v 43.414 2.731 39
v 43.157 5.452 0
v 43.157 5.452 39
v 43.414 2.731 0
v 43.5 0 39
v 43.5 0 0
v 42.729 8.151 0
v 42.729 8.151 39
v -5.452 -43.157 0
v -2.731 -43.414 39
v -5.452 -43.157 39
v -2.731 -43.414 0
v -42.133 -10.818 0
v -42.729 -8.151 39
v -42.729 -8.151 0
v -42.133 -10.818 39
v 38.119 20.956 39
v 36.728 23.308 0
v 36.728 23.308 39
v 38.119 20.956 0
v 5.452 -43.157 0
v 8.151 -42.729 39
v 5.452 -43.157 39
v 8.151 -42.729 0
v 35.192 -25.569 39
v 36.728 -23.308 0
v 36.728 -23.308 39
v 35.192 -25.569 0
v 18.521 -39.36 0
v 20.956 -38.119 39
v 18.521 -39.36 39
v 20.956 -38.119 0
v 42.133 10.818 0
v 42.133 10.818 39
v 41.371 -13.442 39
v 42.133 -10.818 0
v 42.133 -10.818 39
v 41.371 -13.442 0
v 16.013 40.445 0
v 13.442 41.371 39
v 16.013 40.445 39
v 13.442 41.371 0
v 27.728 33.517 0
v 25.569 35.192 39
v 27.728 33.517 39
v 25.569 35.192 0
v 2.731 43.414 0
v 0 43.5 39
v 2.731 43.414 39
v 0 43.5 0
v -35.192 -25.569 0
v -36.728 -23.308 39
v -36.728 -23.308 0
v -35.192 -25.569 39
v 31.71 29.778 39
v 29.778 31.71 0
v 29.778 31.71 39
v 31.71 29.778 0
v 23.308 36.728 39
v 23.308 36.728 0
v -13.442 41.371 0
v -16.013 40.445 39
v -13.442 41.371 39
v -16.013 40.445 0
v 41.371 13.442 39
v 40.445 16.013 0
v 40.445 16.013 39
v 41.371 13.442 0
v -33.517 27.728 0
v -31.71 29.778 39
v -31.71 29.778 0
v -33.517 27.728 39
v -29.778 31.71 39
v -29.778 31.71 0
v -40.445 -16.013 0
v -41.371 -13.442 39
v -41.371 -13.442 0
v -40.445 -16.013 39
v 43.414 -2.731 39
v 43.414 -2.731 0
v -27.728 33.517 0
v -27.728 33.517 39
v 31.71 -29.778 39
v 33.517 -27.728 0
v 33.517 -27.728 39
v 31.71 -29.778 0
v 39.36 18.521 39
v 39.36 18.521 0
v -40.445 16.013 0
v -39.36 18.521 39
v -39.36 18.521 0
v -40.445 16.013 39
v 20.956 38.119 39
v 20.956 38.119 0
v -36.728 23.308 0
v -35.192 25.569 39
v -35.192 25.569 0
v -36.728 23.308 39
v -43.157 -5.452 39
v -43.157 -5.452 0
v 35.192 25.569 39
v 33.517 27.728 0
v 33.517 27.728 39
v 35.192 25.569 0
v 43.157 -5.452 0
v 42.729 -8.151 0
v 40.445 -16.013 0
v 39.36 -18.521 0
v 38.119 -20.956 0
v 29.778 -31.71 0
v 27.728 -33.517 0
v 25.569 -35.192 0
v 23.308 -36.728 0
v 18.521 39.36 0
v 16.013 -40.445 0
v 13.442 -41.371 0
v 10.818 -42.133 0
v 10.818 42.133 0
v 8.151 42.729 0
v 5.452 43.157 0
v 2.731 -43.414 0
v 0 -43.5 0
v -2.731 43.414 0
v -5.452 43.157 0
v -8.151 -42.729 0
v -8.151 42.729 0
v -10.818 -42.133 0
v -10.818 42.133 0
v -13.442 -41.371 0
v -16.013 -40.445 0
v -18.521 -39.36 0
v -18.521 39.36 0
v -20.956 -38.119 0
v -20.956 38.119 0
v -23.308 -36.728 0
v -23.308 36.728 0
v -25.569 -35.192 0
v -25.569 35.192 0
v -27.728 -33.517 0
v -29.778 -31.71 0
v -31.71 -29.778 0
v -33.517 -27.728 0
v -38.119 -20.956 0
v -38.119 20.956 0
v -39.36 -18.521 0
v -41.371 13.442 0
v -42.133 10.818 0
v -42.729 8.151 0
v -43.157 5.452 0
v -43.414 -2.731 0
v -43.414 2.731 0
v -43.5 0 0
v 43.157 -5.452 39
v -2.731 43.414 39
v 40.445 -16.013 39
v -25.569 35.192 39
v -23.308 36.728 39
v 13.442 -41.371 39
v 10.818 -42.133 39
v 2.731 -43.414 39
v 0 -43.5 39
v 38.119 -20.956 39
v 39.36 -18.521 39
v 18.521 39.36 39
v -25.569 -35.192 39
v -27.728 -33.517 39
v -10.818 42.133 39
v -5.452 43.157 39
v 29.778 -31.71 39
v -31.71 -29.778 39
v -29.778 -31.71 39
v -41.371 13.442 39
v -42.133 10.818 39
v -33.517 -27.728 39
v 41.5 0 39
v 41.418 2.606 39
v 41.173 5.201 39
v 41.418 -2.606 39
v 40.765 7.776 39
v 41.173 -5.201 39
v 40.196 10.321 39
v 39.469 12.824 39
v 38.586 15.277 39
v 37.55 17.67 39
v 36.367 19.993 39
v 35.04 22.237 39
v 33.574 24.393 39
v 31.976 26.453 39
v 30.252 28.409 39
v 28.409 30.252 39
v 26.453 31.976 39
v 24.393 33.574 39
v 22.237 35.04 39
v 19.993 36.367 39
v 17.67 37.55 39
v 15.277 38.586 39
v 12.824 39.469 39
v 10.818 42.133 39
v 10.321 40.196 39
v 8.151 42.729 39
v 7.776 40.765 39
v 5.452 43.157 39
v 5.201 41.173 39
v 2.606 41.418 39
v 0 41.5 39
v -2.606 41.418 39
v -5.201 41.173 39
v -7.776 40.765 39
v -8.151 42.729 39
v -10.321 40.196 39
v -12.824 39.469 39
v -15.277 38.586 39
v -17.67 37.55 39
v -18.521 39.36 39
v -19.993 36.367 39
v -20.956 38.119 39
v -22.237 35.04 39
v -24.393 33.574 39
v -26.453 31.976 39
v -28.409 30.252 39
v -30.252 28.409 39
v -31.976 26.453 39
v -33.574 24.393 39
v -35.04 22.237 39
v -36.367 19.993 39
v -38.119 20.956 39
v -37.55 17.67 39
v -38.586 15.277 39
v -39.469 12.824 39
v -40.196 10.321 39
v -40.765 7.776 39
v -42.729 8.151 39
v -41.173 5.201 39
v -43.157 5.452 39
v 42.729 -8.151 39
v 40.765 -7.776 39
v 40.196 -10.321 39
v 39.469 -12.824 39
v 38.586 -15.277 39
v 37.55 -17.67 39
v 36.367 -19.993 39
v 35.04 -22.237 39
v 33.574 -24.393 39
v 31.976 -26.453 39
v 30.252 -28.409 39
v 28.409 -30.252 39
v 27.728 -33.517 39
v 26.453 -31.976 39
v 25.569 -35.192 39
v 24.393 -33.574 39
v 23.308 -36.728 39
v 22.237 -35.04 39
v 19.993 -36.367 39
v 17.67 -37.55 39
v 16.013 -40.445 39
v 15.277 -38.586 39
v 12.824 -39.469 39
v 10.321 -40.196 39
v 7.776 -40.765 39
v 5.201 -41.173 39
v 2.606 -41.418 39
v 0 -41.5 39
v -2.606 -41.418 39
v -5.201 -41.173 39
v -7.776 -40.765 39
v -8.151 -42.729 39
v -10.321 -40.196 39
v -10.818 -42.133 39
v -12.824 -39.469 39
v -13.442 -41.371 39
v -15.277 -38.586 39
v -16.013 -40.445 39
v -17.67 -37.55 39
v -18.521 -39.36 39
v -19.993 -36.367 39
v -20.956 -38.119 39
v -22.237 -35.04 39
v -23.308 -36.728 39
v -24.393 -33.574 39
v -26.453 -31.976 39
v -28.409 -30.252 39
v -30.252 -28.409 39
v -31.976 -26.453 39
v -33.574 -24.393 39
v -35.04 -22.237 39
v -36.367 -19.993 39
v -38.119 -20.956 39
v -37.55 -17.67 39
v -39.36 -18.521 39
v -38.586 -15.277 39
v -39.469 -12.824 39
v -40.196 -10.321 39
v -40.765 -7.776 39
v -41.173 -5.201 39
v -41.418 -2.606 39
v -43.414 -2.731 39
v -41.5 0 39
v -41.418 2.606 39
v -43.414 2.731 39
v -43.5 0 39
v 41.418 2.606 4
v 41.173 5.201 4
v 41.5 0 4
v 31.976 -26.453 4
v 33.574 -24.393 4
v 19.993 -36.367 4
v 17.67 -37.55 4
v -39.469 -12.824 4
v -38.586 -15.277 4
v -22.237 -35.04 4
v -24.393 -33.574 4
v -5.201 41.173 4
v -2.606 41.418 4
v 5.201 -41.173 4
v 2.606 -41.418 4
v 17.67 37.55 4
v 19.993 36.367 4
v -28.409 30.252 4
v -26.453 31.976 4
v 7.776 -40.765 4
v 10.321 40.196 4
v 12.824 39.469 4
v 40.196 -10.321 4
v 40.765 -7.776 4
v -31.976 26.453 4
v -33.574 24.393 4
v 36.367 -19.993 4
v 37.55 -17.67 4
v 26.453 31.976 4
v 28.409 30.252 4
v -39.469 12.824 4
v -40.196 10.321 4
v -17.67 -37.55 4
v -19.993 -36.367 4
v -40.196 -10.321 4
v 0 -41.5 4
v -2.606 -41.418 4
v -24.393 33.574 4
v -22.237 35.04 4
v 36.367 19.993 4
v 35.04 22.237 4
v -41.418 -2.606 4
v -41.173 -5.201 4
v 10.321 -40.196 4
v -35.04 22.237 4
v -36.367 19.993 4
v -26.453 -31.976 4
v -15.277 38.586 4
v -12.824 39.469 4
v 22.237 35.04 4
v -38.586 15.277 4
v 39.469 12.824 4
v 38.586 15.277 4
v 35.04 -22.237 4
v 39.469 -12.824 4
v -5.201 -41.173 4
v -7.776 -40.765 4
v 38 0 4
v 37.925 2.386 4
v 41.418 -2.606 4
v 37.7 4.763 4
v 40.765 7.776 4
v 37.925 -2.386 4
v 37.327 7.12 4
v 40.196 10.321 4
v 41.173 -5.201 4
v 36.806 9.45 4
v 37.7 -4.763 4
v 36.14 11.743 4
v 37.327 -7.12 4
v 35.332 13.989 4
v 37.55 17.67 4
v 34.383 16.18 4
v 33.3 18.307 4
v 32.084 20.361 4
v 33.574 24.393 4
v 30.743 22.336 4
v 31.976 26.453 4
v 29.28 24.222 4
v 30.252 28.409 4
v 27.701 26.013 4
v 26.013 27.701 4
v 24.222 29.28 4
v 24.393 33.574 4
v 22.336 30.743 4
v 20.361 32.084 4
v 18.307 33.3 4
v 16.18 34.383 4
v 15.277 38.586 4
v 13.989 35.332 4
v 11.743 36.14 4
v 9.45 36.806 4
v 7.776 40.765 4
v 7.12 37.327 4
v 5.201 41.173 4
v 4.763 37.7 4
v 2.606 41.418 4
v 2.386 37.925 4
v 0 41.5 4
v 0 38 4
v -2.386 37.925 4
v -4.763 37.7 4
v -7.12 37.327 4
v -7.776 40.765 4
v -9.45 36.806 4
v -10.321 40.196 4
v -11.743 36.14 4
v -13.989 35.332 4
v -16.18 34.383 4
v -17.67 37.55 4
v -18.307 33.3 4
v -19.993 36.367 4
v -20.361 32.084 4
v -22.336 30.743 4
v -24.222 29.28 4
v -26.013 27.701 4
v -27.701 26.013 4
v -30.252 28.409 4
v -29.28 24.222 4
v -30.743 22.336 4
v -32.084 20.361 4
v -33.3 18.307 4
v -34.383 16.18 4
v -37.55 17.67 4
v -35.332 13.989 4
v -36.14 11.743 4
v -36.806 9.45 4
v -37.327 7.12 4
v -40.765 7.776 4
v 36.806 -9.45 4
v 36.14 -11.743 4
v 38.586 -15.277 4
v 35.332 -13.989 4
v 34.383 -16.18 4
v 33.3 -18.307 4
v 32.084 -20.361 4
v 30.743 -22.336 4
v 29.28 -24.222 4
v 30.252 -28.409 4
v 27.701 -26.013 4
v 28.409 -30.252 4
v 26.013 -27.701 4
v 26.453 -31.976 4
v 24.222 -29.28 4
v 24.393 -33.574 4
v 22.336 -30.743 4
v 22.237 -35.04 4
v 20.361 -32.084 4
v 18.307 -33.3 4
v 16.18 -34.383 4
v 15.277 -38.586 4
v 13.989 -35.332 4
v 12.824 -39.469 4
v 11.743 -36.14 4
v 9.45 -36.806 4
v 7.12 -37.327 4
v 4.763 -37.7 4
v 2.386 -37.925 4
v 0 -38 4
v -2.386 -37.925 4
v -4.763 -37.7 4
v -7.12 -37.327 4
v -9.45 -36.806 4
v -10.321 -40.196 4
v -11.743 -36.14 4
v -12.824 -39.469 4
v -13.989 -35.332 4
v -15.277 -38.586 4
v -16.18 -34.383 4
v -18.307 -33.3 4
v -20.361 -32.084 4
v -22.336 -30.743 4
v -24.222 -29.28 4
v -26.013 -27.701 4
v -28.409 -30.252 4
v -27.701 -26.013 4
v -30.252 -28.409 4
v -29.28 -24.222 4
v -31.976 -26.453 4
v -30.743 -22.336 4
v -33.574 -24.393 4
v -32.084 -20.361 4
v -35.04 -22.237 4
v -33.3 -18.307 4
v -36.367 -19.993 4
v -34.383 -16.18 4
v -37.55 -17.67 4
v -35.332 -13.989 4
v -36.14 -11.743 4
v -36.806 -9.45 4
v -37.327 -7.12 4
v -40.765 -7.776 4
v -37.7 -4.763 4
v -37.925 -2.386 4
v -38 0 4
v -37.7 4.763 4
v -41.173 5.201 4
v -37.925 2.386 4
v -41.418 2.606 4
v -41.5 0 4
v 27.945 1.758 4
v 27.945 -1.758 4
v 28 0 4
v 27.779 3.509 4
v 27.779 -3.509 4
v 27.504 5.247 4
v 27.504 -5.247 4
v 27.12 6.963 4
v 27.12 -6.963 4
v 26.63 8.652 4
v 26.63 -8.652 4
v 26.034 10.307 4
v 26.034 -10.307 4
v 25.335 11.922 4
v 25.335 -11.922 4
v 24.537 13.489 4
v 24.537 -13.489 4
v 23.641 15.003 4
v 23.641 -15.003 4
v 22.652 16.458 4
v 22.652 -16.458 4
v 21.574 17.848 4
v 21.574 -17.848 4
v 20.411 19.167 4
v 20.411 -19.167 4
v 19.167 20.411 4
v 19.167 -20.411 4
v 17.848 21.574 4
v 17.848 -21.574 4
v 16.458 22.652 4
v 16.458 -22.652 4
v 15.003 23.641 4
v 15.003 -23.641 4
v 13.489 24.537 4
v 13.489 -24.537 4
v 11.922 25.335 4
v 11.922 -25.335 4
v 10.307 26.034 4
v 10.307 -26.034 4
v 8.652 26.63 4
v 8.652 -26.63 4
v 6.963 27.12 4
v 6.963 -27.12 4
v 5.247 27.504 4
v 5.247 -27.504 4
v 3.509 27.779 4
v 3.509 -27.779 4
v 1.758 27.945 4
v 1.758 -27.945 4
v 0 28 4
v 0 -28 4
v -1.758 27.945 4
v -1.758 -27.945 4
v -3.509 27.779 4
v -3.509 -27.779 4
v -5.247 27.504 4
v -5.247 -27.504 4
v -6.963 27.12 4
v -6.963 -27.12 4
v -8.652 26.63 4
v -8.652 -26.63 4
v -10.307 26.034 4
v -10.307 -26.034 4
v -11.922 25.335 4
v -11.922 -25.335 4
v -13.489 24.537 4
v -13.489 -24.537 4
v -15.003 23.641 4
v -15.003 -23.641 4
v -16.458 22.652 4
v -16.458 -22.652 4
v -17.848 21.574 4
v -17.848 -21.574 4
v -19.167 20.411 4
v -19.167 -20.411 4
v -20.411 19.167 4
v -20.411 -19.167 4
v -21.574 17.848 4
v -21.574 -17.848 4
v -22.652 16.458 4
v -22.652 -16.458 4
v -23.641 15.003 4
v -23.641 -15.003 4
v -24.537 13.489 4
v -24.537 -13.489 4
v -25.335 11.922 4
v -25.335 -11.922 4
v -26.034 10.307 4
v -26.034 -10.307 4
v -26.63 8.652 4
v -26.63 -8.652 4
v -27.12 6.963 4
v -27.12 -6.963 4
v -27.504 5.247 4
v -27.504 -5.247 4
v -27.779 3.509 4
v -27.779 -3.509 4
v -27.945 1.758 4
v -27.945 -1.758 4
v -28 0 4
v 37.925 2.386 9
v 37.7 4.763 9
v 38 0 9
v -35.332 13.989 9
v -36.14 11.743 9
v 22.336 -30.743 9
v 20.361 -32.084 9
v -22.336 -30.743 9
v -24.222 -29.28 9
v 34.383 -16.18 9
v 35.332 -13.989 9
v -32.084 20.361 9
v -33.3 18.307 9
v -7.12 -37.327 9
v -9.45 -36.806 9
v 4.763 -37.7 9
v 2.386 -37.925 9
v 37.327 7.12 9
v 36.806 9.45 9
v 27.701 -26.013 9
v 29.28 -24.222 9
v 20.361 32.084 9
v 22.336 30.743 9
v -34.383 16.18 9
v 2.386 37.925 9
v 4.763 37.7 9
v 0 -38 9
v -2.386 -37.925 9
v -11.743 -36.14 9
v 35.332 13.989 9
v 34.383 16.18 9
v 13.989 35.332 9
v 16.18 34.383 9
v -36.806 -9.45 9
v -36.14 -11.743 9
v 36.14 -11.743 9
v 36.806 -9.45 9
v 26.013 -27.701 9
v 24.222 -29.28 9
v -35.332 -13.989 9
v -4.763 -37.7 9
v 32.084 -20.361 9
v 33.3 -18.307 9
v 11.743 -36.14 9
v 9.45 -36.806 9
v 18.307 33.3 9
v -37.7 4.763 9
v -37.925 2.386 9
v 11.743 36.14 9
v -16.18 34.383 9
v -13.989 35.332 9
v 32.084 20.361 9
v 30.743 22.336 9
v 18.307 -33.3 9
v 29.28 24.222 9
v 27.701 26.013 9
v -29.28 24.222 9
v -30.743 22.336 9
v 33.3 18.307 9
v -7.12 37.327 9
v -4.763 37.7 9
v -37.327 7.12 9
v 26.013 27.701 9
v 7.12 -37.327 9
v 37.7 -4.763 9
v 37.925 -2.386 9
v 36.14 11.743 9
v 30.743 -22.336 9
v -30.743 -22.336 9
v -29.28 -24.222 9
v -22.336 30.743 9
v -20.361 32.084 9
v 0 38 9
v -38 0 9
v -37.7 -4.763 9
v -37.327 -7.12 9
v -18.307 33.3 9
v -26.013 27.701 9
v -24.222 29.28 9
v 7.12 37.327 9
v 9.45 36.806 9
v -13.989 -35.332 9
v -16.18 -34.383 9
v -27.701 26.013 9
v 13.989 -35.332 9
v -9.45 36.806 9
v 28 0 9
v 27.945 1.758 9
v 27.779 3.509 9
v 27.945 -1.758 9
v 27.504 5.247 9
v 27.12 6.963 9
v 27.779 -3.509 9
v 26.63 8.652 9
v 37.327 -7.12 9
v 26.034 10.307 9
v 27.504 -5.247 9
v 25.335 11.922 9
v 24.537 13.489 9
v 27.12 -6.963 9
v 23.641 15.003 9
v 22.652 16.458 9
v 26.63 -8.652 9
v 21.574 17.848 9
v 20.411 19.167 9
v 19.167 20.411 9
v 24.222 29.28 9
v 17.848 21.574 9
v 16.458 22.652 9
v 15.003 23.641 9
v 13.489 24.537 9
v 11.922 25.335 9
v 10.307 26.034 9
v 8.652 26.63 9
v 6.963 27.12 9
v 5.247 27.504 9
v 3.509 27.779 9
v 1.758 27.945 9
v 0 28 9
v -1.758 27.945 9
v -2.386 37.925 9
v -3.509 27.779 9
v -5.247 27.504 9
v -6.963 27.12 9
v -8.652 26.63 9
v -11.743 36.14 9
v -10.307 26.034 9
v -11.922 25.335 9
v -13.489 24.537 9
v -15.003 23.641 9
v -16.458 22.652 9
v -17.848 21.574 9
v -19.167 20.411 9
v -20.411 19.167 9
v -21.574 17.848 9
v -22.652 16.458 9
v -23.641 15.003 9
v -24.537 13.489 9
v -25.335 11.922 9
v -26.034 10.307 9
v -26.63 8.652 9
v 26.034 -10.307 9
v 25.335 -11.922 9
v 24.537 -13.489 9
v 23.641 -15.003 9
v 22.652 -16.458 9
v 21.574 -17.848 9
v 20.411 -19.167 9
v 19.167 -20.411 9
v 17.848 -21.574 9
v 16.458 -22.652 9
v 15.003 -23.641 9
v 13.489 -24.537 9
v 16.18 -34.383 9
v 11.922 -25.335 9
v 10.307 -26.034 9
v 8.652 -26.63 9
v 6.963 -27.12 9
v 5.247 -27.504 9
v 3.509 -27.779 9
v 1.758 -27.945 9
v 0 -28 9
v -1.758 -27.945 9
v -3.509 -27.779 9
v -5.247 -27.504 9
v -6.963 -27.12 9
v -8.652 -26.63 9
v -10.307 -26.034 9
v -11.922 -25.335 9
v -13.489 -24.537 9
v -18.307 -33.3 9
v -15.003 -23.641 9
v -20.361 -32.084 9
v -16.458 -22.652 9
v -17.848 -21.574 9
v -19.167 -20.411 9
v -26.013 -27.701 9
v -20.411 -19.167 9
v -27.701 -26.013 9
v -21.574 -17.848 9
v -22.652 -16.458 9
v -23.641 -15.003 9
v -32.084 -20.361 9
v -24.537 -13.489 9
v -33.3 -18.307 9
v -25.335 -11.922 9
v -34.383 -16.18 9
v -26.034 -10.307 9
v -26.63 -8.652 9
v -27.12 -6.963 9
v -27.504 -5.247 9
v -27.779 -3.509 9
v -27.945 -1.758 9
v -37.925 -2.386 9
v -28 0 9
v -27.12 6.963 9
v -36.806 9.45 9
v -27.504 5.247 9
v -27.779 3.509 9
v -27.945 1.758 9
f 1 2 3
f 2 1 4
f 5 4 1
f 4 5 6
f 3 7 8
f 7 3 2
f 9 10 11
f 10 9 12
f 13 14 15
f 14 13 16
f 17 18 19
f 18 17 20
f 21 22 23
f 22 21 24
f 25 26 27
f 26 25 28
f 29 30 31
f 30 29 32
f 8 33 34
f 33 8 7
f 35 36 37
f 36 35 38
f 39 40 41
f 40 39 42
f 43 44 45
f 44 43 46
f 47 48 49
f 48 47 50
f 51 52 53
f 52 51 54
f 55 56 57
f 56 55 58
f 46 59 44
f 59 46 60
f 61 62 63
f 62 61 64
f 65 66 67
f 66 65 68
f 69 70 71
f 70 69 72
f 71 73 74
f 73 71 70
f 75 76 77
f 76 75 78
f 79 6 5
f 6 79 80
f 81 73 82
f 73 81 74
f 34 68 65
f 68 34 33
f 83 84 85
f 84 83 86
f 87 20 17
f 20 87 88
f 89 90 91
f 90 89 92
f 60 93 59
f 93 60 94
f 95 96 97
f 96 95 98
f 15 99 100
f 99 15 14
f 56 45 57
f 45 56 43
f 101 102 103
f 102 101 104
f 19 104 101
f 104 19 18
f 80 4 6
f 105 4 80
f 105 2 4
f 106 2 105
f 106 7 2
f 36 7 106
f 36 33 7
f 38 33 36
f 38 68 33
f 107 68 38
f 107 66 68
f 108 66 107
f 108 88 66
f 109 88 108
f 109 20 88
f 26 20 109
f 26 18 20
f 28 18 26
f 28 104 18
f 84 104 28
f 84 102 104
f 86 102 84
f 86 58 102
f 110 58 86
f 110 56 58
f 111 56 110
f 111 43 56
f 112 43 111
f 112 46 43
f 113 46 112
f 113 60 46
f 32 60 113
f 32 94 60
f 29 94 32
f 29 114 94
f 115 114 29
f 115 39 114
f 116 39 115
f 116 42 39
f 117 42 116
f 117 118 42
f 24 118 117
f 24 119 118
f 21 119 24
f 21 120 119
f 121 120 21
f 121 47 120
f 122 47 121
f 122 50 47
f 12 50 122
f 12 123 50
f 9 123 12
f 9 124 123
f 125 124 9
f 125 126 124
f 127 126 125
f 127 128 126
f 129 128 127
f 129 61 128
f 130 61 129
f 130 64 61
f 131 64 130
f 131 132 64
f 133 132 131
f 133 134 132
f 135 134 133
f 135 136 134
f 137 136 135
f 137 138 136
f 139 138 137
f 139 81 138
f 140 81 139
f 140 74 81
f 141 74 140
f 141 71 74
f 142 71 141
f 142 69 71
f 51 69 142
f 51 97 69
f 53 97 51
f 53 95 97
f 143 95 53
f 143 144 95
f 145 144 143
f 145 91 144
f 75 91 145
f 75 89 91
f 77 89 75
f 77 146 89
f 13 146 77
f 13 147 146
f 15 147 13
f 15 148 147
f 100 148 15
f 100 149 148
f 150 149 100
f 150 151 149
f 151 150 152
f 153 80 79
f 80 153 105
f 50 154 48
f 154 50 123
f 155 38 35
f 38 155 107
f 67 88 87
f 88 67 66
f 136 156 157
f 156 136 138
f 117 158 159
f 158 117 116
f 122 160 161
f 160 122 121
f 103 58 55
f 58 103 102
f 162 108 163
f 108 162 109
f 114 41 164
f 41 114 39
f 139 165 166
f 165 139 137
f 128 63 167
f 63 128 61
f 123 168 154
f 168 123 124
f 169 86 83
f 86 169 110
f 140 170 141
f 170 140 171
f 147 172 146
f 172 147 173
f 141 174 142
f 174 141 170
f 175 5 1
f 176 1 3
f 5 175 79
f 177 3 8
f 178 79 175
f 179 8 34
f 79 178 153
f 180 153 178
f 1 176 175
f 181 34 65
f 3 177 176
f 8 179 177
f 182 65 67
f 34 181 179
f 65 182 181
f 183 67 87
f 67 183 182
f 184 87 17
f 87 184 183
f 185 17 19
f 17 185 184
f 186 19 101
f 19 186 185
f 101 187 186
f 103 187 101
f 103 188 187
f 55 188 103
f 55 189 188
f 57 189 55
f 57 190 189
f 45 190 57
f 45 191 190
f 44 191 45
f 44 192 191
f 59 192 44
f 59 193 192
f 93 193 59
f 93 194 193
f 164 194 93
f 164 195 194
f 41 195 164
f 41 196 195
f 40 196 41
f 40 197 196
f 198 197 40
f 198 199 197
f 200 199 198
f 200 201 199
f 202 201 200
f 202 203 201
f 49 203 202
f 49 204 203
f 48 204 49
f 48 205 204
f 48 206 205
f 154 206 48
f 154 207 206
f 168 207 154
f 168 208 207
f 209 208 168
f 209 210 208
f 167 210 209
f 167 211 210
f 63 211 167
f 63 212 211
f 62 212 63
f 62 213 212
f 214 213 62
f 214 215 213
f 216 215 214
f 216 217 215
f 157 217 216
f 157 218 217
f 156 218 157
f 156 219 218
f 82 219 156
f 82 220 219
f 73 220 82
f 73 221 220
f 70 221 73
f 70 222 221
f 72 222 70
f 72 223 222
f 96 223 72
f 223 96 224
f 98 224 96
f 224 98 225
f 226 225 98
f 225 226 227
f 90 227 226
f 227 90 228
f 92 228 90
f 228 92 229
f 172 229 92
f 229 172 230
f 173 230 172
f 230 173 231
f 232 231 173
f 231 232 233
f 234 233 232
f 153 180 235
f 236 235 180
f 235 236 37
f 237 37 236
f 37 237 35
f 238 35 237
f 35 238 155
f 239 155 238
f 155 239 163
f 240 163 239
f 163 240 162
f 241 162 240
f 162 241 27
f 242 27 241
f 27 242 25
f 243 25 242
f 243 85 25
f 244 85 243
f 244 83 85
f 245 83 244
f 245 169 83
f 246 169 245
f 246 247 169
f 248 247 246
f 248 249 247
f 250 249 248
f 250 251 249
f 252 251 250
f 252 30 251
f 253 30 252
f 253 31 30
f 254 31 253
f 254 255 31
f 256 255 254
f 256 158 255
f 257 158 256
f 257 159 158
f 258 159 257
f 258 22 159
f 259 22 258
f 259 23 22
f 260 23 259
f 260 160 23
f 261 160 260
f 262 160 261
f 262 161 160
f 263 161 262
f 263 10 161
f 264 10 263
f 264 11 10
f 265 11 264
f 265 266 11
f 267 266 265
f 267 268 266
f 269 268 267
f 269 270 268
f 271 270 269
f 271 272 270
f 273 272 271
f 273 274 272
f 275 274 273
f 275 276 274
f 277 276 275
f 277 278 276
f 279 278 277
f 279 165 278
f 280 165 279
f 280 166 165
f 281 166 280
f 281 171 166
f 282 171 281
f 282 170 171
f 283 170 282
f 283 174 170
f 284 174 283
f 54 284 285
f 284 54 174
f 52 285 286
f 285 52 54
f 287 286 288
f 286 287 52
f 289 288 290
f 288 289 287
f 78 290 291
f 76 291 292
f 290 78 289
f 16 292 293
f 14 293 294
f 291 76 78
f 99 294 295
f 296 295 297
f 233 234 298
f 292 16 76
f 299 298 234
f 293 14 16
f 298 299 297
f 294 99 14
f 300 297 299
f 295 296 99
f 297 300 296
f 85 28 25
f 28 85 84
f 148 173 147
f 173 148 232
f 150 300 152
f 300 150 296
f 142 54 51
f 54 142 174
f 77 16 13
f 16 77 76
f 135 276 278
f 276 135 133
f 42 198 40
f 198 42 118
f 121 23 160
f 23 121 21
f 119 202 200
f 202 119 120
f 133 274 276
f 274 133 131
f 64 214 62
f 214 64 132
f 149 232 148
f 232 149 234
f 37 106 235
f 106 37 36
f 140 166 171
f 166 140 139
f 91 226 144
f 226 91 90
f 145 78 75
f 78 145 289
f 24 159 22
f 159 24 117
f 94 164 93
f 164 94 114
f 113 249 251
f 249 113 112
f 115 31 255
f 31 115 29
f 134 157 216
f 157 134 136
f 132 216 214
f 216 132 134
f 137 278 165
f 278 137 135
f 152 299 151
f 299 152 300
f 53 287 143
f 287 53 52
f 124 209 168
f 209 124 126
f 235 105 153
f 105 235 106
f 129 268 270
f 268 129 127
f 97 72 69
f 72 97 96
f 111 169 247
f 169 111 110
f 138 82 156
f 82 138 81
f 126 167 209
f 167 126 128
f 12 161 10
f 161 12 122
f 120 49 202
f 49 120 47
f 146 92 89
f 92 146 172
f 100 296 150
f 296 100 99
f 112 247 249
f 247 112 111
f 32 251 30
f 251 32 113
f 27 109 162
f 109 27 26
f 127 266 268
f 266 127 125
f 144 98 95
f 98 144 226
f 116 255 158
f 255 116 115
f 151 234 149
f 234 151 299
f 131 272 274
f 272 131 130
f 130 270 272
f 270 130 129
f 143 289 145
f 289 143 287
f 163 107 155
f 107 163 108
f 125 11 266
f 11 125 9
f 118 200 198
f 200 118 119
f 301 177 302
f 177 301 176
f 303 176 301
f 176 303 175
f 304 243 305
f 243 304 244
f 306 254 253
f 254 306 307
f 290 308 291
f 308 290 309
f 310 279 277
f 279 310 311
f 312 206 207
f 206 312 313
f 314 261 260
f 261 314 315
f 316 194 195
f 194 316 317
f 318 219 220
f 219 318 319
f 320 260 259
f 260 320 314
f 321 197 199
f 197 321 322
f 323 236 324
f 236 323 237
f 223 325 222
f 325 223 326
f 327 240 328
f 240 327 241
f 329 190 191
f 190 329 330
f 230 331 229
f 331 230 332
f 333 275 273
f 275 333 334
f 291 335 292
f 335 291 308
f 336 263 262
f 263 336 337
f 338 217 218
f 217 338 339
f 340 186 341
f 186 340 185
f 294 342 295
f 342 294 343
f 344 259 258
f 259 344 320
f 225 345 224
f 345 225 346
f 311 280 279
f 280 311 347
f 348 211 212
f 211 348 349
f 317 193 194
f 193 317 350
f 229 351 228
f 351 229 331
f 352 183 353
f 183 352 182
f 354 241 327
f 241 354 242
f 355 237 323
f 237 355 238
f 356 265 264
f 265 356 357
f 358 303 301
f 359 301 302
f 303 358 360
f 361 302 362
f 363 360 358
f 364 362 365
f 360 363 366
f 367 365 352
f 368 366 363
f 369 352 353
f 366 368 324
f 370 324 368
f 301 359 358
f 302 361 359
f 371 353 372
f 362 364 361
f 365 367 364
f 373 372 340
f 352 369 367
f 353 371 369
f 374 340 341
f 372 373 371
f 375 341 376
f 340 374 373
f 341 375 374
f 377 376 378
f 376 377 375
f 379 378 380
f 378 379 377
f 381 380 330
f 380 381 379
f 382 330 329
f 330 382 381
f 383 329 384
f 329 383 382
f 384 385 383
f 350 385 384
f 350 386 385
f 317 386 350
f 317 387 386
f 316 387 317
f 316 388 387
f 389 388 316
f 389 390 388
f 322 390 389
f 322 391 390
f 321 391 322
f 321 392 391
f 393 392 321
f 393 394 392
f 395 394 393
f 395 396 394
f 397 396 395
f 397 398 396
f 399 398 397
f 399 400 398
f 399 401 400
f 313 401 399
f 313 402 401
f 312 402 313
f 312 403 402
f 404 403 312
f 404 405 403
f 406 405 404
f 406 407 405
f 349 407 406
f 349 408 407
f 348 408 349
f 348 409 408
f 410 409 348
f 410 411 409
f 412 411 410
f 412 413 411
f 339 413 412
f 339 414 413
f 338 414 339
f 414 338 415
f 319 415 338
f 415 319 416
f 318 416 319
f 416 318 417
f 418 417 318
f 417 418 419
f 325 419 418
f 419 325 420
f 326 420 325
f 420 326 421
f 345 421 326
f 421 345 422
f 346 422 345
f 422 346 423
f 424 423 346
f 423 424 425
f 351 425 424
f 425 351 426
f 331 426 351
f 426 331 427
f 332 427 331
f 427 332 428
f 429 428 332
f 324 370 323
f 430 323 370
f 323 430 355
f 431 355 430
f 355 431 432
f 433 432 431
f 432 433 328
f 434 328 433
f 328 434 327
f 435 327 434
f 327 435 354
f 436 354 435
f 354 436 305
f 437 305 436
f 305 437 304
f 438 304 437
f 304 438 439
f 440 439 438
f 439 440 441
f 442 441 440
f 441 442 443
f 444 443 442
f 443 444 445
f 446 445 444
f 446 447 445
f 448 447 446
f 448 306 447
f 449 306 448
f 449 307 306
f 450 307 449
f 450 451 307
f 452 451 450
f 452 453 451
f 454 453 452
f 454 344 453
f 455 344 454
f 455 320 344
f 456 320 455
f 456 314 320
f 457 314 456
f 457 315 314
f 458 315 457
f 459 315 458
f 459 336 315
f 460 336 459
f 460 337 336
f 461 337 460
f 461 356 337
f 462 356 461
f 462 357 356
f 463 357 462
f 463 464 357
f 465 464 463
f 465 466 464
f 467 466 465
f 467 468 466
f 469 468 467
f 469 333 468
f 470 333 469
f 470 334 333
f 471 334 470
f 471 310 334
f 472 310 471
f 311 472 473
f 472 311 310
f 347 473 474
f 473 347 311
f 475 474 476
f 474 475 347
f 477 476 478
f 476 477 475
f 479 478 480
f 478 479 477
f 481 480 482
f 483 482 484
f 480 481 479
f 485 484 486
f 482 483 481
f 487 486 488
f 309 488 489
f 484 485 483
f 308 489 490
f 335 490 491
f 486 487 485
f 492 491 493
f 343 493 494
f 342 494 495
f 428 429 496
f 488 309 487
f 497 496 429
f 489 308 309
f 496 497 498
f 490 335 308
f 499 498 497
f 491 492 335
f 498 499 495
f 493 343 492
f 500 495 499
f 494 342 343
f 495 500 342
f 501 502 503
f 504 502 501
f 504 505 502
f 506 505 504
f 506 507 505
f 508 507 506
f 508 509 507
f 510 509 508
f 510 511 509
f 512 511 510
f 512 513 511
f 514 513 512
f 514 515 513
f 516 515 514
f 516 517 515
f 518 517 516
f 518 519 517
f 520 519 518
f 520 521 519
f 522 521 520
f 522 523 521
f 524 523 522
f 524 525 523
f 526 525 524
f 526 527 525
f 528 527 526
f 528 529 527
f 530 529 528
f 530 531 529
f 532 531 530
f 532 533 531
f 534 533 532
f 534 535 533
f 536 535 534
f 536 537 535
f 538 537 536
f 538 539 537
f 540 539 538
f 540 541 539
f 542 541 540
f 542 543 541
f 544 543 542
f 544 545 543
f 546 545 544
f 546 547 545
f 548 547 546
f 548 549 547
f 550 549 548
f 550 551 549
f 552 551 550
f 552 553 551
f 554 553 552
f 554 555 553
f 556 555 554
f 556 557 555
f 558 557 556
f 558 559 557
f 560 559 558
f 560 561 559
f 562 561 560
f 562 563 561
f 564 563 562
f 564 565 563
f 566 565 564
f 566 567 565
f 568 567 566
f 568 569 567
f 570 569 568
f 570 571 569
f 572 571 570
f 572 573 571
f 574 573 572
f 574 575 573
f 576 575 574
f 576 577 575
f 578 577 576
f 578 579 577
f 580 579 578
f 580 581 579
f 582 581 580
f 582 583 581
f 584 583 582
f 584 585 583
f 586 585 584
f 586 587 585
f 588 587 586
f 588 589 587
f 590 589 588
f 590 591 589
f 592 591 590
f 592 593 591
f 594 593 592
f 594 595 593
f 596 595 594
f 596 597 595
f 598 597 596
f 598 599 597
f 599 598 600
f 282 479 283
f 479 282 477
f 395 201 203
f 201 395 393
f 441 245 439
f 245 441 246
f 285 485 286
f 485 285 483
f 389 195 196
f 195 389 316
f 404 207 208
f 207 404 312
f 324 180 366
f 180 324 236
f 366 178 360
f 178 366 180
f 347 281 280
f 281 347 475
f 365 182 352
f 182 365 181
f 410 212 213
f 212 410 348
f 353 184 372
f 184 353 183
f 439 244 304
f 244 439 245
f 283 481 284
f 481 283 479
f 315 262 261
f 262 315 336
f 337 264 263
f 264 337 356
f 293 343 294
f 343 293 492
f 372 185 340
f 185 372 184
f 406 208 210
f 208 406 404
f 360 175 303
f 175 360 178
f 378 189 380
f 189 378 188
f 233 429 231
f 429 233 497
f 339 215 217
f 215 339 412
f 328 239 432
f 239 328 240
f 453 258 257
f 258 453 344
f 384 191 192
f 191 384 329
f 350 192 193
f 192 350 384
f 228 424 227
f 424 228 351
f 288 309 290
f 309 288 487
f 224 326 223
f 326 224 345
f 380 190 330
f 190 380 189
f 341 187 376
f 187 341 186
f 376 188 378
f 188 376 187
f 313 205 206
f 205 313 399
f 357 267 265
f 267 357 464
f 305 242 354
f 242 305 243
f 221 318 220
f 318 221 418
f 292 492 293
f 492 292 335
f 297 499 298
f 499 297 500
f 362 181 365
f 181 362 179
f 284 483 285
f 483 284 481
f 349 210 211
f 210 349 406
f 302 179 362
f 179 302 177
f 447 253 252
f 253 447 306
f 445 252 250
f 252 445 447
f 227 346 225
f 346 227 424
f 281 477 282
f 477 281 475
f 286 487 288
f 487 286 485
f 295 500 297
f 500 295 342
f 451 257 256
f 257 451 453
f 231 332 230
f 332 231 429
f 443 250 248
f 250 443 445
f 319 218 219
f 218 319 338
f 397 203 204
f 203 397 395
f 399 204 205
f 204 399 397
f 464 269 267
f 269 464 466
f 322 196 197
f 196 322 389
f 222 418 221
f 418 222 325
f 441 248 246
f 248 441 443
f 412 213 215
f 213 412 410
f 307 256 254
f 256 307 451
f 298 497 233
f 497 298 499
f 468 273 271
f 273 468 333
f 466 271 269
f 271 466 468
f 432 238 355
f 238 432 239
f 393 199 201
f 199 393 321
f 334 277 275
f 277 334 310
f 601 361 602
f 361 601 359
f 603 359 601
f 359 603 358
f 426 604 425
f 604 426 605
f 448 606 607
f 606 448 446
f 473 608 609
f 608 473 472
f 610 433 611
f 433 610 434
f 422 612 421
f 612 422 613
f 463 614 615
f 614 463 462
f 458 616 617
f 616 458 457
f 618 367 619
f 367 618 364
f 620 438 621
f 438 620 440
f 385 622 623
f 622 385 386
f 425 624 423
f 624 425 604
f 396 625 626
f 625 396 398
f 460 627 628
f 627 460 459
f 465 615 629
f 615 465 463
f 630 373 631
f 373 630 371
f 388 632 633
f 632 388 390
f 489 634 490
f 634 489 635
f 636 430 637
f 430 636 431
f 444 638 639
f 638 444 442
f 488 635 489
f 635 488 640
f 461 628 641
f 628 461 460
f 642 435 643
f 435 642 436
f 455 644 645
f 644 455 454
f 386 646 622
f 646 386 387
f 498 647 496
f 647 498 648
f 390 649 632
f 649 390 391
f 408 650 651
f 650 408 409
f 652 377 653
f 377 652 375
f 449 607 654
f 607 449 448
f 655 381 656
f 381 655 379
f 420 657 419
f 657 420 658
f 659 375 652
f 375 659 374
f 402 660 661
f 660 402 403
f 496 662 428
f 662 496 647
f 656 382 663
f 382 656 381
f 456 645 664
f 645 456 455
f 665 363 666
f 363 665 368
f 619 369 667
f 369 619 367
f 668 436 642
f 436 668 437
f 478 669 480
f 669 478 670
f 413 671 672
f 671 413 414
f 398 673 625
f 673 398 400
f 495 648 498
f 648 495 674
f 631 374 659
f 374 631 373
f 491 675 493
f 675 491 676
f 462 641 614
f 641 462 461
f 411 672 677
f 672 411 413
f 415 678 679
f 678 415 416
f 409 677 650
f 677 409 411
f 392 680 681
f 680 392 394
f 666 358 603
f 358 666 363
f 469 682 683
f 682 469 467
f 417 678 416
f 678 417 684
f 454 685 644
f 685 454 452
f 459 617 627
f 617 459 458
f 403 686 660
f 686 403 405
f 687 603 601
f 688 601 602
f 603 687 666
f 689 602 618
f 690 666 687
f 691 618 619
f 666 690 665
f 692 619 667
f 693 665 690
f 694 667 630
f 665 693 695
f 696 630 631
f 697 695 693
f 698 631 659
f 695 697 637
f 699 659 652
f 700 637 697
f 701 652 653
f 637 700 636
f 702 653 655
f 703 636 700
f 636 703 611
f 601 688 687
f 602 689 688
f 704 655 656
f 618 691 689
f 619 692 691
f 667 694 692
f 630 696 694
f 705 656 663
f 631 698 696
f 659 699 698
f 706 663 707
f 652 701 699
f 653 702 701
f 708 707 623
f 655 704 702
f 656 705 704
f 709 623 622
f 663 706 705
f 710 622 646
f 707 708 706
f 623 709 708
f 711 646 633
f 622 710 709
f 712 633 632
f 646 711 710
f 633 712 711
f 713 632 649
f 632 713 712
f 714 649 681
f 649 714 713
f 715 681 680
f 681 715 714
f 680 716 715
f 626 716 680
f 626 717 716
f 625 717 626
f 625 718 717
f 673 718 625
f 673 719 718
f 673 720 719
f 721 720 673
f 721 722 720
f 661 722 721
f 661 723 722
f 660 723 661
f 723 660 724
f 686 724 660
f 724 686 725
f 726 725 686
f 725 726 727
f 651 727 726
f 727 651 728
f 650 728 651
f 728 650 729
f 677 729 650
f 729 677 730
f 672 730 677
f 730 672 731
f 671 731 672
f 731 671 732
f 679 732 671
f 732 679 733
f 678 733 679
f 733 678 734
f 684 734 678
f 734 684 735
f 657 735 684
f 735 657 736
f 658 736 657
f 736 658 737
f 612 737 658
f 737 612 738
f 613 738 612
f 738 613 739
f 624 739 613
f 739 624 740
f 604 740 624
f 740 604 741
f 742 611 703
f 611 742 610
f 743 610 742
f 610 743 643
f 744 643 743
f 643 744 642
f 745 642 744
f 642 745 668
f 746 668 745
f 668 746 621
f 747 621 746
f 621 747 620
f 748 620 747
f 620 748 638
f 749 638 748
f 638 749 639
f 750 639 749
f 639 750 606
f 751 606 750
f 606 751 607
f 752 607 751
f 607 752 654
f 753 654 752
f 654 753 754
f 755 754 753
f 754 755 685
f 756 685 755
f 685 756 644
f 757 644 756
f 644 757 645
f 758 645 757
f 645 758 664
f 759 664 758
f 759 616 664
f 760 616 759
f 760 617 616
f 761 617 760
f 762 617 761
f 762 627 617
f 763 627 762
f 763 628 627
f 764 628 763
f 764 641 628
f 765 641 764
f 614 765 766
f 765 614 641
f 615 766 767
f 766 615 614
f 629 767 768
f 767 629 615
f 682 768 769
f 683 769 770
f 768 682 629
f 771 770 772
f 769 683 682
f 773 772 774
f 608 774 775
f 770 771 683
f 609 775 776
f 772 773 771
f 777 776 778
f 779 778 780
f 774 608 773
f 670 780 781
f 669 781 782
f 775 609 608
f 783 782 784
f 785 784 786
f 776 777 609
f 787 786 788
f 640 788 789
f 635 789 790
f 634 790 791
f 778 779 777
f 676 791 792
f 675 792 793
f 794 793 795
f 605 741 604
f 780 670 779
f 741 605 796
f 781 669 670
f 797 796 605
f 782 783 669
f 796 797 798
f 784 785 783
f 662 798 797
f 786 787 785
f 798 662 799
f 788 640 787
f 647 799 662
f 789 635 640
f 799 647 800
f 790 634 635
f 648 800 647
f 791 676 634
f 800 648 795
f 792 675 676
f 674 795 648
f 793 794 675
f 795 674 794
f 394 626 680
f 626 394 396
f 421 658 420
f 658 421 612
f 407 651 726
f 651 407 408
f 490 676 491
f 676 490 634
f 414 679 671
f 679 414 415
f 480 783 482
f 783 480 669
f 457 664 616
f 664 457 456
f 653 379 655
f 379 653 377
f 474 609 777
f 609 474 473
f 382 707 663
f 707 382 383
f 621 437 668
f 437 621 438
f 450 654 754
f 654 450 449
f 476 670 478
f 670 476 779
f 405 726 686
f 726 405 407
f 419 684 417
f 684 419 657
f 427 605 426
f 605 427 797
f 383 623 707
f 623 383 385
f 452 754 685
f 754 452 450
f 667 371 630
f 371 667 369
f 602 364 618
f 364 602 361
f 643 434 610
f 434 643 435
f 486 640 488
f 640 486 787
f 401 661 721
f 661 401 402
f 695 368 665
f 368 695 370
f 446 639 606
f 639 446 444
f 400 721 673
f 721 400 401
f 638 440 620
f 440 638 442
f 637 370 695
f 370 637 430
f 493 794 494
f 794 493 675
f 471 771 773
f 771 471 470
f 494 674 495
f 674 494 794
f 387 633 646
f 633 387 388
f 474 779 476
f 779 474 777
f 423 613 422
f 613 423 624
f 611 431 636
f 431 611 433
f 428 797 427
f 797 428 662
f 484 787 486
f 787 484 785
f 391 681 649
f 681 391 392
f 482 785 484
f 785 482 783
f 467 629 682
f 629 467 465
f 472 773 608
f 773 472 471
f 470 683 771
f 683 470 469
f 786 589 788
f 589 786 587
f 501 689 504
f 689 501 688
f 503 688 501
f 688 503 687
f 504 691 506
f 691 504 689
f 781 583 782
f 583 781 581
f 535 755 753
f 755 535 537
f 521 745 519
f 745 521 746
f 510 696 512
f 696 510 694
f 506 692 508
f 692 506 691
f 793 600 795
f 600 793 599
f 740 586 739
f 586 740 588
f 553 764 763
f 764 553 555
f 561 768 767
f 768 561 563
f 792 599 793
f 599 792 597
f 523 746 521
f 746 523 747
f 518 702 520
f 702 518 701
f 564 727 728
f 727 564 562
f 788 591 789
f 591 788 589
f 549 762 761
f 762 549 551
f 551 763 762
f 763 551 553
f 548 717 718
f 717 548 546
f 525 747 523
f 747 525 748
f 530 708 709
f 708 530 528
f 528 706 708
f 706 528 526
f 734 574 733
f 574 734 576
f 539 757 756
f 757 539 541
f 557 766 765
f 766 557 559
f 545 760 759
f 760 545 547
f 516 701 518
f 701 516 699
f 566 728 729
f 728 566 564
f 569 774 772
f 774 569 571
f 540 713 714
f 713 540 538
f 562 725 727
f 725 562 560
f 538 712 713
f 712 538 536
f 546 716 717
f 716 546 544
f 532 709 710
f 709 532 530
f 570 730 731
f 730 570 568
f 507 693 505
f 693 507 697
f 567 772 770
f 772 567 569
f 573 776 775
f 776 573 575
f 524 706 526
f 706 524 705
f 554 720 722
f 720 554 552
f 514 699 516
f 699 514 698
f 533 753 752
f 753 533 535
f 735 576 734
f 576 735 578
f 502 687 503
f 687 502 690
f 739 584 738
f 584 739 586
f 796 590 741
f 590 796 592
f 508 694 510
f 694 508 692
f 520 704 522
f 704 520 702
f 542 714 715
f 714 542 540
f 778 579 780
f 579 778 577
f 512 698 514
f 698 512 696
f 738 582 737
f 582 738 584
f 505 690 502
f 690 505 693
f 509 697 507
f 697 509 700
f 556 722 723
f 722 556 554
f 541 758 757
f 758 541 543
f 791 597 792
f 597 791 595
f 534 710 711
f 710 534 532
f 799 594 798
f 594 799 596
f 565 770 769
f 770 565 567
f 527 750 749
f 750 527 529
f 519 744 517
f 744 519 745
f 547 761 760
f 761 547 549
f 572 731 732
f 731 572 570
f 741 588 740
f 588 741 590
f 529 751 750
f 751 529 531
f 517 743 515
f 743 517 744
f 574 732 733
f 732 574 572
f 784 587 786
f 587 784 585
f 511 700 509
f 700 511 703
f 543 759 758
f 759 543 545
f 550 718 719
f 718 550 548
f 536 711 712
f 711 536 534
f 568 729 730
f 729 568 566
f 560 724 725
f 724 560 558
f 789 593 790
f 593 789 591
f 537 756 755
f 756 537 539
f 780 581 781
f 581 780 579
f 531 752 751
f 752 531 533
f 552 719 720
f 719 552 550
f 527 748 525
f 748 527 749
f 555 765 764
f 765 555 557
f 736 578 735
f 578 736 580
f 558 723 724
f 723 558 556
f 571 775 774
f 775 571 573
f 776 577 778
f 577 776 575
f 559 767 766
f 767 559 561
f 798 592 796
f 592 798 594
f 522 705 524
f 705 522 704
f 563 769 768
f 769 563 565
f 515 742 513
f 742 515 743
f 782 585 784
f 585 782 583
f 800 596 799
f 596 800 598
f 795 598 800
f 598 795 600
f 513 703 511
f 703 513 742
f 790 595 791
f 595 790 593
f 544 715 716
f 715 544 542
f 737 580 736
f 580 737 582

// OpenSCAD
$fn = 100;

module lens_cover(r, ri, h, t){
    difference(){
        cylinder(r=r+t, h=h);
        translate([0, 0, 4]) cylinder(r=r, h=h);
    }

    difference(){
        cylinder(r=ri, h=9);
        translate([0, 0, 4]) cylinder(r=ri-10, h=h);
    }
}

lens_cover(
     r=41.5,
     ri=38,
     h=39,
     t=2);
